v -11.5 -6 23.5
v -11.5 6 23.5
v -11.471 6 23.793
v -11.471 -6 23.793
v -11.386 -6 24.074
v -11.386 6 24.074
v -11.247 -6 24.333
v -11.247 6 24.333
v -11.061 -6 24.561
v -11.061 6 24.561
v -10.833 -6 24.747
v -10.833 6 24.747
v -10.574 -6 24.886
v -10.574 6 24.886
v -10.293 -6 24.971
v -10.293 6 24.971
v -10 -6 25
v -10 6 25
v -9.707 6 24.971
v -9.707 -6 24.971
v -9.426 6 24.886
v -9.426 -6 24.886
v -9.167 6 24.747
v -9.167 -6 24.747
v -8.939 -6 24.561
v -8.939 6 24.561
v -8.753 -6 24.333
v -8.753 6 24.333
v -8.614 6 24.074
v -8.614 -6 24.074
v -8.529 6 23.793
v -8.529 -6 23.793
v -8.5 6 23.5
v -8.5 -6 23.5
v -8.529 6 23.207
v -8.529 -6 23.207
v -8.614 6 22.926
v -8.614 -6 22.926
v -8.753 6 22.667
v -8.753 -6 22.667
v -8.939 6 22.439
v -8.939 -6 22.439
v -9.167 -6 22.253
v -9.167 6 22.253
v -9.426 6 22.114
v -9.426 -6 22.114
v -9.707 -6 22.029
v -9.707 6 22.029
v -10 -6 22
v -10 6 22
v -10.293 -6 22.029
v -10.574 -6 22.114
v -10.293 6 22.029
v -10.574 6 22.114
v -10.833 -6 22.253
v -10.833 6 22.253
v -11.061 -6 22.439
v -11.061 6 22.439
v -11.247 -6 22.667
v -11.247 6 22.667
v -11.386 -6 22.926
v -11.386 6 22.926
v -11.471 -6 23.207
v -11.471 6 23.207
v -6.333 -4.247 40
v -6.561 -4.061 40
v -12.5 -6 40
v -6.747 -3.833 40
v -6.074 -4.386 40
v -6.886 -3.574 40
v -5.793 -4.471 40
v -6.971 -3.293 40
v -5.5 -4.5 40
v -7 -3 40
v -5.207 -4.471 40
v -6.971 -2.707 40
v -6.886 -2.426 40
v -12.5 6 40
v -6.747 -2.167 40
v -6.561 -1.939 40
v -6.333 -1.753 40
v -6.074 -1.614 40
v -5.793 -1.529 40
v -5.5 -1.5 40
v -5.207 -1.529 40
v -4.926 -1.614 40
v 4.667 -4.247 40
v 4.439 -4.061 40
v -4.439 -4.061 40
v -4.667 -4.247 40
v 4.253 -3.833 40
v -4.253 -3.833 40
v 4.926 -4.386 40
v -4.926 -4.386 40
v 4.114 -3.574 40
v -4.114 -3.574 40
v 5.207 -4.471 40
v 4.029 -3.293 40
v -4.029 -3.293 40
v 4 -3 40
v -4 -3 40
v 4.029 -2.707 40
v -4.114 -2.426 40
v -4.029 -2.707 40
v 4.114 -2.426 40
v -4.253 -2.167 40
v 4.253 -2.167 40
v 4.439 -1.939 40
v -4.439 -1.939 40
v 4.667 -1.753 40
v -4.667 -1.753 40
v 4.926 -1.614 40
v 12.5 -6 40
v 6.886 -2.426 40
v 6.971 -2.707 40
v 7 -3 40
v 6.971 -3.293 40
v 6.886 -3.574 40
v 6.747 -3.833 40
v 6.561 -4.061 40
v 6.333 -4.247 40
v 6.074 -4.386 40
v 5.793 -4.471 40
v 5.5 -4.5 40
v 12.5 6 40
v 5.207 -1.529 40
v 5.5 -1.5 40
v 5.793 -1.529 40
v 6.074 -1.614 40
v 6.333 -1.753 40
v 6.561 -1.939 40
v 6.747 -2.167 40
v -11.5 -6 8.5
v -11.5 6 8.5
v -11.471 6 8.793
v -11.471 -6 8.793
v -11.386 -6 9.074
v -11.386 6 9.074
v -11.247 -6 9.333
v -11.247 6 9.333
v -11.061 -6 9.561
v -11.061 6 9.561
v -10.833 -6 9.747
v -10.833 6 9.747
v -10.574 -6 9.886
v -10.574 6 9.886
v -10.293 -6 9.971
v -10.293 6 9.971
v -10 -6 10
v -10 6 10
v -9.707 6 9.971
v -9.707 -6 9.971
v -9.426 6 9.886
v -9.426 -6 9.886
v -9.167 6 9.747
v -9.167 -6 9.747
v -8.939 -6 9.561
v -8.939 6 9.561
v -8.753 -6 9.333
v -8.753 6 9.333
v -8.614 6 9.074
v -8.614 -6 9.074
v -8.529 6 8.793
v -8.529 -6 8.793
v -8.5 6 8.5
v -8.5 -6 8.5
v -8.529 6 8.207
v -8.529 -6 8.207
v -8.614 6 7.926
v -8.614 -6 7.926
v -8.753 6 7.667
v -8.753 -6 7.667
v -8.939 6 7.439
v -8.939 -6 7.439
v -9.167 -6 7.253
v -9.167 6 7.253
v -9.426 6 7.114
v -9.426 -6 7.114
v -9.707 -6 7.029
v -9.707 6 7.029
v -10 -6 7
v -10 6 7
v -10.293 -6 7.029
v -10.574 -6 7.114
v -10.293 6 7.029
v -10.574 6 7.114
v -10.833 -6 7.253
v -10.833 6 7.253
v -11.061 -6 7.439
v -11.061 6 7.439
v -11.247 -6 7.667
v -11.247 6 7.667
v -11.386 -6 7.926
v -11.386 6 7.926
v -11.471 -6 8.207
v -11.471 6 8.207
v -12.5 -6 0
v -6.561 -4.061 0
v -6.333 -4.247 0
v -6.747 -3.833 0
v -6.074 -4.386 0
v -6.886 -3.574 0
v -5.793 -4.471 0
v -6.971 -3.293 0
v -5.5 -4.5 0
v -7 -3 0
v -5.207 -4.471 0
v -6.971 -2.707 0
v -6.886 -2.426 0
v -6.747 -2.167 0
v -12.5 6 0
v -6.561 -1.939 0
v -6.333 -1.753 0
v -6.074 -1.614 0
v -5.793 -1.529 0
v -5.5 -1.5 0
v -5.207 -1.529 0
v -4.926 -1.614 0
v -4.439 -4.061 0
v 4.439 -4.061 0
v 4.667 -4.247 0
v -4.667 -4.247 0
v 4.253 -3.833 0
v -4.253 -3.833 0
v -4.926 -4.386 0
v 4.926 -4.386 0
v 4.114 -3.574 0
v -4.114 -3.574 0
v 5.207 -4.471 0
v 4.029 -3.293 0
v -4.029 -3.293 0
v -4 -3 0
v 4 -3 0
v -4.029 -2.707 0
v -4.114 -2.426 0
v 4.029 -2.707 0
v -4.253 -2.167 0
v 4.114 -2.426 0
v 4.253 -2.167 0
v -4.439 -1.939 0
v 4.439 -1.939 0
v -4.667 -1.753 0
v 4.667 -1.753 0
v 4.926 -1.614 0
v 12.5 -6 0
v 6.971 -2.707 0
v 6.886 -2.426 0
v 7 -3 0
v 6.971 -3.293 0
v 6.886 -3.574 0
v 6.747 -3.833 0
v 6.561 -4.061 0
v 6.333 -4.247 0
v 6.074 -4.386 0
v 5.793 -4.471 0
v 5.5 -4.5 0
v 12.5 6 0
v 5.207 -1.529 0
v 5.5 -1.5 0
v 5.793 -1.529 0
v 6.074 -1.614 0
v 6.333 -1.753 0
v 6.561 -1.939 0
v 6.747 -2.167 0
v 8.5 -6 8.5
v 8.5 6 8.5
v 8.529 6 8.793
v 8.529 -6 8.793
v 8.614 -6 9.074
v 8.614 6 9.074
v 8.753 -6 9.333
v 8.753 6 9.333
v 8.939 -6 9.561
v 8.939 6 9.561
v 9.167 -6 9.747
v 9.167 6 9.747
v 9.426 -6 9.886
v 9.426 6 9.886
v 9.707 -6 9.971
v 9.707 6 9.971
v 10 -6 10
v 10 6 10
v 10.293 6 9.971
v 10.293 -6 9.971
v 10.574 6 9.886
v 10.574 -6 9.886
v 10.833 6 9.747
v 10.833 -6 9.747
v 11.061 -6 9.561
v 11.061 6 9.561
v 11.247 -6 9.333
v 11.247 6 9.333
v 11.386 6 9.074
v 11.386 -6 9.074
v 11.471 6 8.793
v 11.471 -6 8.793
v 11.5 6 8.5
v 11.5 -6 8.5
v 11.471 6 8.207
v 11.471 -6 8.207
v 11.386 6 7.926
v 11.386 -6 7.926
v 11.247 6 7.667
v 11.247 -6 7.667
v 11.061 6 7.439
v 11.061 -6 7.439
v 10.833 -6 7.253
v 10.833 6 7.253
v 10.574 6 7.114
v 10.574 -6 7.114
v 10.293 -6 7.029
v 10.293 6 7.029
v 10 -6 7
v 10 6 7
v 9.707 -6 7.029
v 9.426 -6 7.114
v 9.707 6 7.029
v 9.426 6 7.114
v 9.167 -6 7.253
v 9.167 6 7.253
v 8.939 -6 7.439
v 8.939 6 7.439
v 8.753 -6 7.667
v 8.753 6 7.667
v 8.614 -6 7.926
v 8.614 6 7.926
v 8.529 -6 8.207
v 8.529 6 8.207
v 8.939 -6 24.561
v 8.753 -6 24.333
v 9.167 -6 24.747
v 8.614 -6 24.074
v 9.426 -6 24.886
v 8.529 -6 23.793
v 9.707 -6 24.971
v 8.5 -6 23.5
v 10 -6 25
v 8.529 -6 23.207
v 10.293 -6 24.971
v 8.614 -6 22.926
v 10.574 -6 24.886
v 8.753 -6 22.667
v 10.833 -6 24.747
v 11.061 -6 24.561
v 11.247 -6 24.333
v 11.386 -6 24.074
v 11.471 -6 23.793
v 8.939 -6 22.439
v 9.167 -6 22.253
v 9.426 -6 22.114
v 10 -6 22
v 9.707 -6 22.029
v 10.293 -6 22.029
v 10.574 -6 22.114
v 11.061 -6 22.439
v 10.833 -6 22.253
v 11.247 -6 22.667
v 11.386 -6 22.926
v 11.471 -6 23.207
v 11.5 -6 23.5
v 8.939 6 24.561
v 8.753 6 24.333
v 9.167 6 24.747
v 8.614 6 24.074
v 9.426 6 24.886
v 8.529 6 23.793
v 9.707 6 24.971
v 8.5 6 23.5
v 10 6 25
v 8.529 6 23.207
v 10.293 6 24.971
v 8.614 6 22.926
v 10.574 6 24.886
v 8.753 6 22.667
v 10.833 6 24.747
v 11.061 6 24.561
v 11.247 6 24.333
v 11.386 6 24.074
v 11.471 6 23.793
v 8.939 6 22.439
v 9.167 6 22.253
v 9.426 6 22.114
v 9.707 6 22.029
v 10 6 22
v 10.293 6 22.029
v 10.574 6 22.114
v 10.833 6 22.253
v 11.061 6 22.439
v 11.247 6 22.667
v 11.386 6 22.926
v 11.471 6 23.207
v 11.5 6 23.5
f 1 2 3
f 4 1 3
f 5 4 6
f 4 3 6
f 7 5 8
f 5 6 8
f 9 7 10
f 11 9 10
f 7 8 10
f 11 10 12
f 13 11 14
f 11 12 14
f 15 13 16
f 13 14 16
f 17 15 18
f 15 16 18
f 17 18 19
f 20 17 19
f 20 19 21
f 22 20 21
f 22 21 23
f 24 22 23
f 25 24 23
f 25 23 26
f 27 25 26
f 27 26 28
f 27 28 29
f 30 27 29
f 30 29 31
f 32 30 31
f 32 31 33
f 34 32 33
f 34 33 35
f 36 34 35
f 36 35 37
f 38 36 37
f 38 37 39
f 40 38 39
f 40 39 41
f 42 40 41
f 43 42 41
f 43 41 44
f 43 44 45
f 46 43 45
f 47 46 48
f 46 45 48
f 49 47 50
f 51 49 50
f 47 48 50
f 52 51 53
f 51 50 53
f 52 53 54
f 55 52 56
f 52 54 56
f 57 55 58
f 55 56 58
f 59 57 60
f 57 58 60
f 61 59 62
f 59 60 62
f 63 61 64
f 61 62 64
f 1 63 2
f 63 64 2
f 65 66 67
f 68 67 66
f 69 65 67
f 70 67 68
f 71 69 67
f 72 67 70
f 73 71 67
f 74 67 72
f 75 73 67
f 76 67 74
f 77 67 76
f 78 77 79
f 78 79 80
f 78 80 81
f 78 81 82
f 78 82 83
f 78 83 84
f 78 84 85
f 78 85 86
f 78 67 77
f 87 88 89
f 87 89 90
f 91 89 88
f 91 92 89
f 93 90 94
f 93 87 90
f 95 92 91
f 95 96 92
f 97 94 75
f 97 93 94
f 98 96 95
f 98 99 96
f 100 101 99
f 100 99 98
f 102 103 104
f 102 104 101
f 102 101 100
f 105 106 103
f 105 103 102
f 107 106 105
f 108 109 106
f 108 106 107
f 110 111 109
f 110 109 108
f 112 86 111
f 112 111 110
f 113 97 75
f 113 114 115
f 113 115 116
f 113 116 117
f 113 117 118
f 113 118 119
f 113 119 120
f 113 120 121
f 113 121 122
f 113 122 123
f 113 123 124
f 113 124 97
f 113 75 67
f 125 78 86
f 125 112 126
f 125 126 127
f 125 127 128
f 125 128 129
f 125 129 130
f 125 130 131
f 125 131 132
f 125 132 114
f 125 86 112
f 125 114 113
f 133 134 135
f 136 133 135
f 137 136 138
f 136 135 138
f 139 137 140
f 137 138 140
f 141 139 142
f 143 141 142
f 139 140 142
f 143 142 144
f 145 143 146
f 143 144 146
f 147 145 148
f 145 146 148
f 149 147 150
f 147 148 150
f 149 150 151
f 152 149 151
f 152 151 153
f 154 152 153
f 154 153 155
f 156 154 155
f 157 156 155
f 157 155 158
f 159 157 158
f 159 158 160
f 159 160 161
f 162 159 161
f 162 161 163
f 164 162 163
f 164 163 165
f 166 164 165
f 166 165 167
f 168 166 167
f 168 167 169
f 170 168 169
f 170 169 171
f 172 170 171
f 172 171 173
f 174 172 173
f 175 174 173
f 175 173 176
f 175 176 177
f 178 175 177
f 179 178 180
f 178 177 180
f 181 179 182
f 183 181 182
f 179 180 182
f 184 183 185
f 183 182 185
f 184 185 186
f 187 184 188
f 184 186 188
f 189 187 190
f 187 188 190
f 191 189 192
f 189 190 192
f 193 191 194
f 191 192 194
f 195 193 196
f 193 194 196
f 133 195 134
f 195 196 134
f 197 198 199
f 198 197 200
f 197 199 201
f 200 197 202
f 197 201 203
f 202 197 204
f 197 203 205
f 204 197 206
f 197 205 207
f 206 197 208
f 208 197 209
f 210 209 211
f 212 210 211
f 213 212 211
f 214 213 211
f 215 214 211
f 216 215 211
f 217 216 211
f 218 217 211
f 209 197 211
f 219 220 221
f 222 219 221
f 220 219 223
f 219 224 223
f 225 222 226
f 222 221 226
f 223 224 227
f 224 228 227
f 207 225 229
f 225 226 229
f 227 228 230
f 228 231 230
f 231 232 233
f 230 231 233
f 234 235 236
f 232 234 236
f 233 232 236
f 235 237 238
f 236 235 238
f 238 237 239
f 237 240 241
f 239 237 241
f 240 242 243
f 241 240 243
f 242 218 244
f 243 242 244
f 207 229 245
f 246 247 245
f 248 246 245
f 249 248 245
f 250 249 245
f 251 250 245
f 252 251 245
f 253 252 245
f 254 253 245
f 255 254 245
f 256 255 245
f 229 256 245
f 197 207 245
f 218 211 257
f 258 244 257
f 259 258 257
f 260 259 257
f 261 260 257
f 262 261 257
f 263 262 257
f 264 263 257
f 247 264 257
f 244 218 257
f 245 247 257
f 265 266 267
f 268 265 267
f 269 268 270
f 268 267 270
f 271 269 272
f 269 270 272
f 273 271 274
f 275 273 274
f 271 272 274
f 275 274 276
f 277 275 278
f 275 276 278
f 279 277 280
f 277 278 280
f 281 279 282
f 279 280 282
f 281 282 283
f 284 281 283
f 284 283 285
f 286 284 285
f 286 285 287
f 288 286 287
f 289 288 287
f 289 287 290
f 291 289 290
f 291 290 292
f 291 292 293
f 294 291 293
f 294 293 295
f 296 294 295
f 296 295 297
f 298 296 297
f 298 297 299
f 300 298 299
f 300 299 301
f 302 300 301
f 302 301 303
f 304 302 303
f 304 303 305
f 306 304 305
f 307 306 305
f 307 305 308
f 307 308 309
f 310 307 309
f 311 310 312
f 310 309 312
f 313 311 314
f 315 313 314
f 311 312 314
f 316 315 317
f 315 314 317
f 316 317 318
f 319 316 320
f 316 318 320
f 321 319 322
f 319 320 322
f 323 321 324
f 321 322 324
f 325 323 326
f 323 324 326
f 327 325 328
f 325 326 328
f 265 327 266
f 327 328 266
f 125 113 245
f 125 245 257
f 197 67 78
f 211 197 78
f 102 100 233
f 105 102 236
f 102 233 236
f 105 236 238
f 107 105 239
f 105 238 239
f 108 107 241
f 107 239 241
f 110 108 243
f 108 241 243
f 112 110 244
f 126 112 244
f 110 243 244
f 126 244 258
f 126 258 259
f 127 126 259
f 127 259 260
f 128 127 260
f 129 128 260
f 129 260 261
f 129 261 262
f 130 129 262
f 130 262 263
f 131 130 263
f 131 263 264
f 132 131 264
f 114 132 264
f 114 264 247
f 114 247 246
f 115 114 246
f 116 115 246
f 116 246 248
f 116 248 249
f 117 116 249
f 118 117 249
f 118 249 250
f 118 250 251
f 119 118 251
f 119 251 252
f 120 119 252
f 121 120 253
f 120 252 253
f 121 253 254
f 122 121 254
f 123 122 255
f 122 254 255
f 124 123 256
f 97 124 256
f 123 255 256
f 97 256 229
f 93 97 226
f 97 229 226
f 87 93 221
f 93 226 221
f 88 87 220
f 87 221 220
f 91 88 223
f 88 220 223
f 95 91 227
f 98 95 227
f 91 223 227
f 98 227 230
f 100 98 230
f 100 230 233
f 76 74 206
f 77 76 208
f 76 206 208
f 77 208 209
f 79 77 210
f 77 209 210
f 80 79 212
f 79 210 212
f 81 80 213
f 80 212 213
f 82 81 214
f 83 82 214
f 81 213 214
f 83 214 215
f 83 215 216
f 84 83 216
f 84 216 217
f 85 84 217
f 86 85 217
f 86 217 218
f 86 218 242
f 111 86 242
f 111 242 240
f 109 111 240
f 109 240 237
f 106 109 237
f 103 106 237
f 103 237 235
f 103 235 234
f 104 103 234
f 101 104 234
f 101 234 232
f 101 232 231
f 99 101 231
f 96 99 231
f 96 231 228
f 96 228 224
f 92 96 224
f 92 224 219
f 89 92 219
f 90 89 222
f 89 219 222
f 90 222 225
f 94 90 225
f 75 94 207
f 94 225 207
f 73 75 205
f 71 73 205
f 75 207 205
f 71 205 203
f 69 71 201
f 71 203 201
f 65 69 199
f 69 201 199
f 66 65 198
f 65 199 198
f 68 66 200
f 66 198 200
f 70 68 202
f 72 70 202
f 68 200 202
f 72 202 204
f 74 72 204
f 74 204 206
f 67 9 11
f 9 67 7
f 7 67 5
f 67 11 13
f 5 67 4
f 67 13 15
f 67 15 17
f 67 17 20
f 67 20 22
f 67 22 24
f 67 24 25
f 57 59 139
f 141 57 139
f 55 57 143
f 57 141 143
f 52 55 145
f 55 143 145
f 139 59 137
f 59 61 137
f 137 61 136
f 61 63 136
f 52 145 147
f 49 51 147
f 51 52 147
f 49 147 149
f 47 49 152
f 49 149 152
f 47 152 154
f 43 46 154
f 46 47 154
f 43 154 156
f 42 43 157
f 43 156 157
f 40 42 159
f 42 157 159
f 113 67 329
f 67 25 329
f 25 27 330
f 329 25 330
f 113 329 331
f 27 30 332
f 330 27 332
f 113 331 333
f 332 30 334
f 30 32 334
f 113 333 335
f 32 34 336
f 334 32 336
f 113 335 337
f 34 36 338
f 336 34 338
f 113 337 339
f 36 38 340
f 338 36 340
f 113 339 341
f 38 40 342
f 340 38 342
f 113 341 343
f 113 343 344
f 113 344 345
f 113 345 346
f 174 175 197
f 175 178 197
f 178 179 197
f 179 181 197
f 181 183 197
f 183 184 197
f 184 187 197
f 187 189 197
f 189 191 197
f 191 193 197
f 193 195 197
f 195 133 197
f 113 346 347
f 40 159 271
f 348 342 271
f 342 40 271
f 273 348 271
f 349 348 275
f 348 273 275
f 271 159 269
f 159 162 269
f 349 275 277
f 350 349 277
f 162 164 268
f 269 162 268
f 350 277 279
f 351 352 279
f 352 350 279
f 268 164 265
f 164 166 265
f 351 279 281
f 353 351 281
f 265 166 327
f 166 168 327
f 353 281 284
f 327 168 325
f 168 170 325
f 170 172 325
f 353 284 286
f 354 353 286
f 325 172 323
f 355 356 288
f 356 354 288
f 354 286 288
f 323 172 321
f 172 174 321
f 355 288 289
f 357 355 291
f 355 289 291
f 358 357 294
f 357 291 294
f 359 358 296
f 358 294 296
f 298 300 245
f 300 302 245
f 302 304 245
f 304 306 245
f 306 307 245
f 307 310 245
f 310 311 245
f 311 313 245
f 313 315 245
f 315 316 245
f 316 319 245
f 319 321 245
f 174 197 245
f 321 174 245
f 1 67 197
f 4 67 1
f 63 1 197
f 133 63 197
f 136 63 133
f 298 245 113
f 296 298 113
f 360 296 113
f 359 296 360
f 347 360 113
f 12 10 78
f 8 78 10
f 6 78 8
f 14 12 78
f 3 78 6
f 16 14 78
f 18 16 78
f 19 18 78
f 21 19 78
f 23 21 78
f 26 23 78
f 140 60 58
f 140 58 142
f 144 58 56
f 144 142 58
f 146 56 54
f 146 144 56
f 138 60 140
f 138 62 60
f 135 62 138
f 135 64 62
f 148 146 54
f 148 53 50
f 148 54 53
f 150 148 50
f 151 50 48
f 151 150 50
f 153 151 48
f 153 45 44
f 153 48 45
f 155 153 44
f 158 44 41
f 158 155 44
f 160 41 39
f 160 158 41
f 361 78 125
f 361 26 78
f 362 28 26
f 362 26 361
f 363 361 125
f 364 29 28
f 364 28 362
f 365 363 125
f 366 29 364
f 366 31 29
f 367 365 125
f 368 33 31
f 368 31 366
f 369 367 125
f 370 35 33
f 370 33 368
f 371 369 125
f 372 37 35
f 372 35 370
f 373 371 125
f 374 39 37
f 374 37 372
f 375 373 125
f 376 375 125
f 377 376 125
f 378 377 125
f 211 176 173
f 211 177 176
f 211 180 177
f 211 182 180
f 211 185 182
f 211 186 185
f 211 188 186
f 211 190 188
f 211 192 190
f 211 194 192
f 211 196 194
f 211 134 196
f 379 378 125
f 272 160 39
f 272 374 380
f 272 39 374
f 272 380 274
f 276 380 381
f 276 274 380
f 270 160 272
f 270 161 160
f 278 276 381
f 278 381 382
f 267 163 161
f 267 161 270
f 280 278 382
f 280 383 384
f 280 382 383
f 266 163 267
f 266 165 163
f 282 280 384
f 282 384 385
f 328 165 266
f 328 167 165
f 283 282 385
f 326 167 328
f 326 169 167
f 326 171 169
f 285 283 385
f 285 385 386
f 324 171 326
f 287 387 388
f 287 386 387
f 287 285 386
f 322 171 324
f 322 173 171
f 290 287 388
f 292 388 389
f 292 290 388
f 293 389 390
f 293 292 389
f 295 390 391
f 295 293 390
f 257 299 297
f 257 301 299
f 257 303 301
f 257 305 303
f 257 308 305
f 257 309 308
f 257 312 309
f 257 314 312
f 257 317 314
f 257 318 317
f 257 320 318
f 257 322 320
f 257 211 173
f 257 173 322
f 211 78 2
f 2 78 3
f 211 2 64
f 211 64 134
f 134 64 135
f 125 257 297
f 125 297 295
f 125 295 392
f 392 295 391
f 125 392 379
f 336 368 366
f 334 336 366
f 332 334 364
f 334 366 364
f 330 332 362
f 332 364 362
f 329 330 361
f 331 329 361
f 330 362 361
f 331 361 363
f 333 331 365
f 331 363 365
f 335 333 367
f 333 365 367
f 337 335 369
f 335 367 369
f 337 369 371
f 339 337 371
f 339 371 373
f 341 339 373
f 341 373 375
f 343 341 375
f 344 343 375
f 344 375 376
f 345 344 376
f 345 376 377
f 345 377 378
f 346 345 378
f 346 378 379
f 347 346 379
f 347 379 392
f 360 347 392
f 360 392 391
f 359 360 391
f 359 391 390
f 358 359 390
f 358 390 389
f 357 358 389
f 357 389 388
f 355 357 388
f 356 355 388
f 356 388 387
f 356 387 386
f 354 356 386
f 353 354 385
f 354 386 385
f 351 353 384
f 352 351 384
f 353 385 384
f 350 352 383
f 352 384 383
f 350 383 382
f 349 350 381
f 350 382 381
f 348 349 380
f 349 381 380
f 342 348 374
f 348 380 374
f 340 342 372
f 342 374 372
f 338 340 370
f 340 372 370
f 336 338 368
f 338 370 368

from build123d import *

# Parameters (mm, degrees)
F0_W     = 25
F0_H     = 12
F1_DEPTH = 40
F3_D     = 3
F5_D     = 3


# Not quite as in the source:
# - a feature names something its author has since deleted; it is built from what else it names


with BuildPart() as f1:
    # F0 (on Top) → F1 (new body)
    with BuildSketch(Plane.XY):
        Rectangle(F0_W, F0_H)
    extrude(amount=F1_DEPTH)

    # F3 (through all)
    with Locations(Plane.XZ.offset(6)):
        with Locations((-10, 23.5), (-10, 8.5), (10, 8.5), (10, 23.5)):
            Hole(F3_D / 2)

    # F5 (through all)
    with Locations(Plane.XY.offset(40)):
        with Locations((-5.5, -3), (5.5, -3), (-5.5, -3), (5.5, -3)):
            Hole(F5_D / 2)


solid = f1.part
